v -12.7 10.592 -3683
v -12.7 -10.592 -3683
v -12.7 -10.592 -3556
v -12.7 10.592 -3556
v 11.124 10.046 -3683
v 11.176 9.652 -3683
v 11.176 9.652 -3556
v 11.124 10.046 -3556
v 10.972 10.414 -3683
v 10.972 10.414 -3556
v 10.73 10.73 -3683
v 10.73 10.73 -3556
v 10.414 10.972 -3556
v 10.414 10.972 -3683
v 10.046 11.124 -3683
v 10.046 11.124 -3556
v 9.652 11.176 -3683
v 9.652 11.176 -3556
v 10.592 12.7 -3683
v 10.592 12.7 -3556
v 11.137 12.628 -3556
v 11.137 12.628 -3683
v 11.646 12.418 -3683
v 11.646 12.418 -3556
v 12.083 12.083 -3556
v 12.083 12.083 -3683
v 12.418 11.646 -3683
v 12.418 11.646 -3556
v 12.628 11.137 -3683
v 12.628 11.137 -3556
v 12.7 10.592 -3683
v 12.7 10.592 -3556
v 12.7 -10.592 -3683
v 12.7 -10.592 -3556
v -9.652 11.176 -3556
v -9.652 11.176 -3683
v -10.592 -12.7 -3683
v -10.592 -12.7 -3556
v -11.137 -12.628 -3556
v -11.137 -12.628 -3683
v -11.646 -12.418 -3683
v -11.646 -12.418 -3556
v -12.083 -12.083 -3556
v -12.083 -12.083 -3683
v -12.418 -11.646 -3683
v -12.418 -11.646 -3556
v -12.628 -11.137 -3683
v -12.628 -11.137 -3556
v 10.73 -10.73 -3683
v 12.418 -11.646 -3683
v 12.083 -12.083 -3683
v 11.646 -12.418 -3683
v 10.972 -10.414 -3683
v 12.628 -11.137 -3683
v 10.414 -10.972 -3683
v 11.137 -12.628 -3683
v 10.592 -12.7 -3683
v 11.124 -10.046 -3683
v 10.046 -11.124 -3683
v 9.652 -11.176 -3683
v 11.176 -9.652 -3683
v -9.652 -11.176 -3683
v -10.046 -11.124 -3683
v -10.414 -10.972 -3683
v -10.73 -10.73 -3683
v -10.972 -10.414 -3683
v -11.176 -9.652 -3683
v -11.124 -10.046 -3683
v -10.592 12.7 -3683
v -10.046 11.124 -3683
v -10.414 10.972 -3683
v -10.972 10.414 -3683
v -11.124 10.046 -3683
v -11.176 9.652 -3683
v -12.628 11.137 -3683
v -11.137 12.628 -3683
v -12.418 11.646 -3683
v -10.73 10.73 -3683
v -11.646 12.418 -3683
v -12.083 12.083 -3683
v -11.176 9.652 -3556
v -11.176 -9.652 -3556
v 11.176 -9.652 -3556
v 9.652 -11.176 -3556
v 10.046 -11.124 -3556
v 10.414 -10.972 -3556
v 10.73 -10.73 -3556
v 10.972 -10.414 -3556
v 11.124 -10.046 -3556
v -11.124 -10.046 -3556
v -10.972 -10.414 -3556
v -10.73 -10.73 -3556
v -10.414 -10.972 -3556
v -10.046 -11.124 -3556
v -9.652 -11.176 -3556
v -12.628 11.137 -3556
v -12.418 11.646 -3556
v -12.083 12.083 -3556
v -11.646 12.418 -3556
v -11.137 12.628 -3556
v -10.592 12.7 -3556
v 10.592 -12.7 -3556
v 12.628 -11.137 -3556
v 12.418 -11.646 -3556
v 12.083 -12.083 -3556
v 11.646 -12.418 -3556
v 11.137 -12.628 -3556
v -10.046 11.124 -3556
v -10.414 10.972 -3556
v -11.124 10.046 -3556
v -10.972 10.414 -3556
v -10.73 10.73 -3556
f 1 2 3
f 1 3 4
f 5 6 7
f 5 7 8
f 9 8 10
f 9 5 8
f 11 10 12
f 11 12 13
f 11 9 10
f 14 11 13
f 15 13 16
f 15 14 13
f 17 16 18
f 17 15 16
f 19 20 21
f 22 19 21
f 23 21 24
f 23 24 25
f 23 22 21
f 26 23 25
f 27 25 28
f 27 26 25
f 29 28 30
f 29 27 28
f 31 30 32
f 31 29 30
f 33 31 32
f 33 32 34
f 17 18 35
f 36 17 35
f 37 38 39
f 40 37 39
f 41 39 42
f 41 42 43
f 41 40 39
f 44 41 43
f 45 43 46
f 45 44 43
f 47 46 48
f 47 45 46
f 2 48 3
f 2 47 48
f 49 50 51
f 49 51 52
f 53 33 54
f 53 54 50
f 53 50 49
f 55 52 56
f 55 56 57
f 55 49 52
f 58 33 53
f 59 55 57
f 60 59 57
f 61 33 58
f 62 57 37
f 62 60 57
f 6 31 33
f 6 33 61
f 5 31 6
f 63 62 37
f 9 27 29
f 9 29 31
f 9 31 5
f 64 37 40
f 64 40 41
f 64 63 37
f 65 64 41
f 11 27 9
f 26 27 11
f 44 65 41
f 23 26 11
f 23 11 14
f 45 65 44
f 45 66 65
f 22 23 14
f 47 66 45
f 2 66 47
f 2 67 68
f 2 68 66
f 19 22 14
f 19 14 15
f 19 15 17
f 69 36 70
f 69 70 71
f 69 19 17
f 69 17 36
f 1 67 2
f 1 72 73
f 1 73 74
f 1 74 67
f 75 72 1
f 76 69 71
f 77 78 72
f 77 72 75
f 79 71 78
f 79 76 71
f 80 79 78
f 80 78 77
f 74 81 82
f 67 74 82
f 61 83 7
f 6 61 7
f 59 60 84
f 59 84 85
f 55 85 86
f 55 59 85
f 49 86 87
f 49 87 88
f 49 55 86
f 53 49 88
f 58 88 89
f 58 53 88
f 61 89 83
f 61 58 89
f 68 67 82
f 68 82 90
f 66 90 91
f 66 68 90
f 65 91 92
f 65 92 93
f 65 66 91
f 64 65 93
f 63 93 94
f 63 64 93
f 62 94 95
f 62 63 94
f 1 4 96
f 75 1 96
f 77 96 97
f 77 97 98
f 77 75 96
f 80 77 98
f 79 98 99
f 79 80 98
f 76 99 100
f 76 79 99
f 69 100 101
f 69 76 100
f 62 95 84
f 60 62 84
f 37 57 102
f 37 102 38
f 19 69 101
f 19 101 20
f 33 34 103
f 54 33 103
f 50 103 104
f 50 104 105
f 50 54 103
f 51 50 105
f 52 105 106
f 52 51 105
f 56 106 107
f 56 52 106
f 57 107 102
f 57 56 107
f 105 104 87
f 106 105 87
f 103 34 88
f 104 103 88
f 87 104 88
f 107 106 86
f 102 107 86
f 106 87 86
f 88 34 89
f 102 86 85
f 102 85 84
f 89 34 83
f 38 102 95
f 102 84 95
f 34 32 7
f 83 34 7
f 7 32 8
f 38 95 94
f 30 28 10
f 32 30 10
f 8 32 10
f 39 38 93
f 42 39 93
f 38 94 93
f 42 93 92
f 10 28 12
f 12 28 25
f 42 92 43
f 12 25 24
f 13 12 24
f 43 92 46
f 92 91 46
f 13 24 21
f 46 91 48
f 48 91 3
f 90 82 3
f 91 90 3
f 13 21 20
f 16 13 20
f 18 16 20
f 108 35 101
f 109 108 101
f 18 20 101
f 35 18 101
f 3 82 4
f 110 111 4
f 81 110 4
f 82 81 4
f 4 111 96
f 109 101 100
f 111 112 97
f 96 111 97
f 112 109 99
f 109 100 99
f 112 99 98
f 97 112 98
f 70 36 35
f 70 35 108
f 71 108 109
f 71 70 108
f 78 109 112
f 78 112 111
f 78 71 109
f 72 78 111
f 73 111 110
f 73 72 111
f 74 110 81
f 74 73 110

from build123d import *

# Parameters (mm, degrees)
BOSS_EXTRUDE1_DEPTH = 127


with BuildPart() as part:
    # Sketch1 → Boss-Extrude1 (new body)
    with BuildSketch(Plane(origin=(0, 0, -3683), x_dir=(-1, 0, 0), z_dir=(0, 0, -1))):
        with BuildLine():
            Line((12.7, -10.5918), (12.7, 10.5918))
            ThreePointArc((12.7, 10.5918), (12.082522516, 12.082522516), (10.5918, 12.7))
            Line((10.5918, 12.7), (-10.5918, 12.7))
            ThreePointArc((-10.5918, 12.7), (-12.082522516, 12.082522516), (-12.7, 10.5918))
            Line((-12.7, 10.5918), (-12.7, -10.5918))
            ThreePointArc((-12.7, -10.5918), (-12.082522516, -12.082522516), (-10.5918, -12.7))
            Line((-10.5918, -12.7), (10.5918, -12.7))
            ThreePointArc((10.5918, -12.7), (12.082522516, -12.082522516), (12.7, -10.5918))
        make_face()
        with BuildLine():
            Line((11.176, 9.652), (11.176, -9.652))
            ThreePointArc((11.176, -9.652), (10.729630735, -10.729630735), (9.652, -11.176))
            Line((9.652, -11.176), (-9.652, -11.176))
            ThreePointArc((-9.652, -11.176), (-10.729630735, -10.729630735), (-11.176, -9.652))
            Line((-11.176, -9.652), (-11.176, 9.652))
            ThreePointArc((-11.176, 9.652), (-10.729630735, 10.729630735), (-9.652, 11.176))
            Line((-9.652, 11.176), (9.652, 11.176))
            ThreePointArc((9.652, 11.176), (10.729630735, 10.729630735), (11.176, 9.652))
        make_face(mode=Mode.SUBTRACT)
    extrude(amount=-BOSS_EXTRUDE1_DEPTH)


solid = part.part
